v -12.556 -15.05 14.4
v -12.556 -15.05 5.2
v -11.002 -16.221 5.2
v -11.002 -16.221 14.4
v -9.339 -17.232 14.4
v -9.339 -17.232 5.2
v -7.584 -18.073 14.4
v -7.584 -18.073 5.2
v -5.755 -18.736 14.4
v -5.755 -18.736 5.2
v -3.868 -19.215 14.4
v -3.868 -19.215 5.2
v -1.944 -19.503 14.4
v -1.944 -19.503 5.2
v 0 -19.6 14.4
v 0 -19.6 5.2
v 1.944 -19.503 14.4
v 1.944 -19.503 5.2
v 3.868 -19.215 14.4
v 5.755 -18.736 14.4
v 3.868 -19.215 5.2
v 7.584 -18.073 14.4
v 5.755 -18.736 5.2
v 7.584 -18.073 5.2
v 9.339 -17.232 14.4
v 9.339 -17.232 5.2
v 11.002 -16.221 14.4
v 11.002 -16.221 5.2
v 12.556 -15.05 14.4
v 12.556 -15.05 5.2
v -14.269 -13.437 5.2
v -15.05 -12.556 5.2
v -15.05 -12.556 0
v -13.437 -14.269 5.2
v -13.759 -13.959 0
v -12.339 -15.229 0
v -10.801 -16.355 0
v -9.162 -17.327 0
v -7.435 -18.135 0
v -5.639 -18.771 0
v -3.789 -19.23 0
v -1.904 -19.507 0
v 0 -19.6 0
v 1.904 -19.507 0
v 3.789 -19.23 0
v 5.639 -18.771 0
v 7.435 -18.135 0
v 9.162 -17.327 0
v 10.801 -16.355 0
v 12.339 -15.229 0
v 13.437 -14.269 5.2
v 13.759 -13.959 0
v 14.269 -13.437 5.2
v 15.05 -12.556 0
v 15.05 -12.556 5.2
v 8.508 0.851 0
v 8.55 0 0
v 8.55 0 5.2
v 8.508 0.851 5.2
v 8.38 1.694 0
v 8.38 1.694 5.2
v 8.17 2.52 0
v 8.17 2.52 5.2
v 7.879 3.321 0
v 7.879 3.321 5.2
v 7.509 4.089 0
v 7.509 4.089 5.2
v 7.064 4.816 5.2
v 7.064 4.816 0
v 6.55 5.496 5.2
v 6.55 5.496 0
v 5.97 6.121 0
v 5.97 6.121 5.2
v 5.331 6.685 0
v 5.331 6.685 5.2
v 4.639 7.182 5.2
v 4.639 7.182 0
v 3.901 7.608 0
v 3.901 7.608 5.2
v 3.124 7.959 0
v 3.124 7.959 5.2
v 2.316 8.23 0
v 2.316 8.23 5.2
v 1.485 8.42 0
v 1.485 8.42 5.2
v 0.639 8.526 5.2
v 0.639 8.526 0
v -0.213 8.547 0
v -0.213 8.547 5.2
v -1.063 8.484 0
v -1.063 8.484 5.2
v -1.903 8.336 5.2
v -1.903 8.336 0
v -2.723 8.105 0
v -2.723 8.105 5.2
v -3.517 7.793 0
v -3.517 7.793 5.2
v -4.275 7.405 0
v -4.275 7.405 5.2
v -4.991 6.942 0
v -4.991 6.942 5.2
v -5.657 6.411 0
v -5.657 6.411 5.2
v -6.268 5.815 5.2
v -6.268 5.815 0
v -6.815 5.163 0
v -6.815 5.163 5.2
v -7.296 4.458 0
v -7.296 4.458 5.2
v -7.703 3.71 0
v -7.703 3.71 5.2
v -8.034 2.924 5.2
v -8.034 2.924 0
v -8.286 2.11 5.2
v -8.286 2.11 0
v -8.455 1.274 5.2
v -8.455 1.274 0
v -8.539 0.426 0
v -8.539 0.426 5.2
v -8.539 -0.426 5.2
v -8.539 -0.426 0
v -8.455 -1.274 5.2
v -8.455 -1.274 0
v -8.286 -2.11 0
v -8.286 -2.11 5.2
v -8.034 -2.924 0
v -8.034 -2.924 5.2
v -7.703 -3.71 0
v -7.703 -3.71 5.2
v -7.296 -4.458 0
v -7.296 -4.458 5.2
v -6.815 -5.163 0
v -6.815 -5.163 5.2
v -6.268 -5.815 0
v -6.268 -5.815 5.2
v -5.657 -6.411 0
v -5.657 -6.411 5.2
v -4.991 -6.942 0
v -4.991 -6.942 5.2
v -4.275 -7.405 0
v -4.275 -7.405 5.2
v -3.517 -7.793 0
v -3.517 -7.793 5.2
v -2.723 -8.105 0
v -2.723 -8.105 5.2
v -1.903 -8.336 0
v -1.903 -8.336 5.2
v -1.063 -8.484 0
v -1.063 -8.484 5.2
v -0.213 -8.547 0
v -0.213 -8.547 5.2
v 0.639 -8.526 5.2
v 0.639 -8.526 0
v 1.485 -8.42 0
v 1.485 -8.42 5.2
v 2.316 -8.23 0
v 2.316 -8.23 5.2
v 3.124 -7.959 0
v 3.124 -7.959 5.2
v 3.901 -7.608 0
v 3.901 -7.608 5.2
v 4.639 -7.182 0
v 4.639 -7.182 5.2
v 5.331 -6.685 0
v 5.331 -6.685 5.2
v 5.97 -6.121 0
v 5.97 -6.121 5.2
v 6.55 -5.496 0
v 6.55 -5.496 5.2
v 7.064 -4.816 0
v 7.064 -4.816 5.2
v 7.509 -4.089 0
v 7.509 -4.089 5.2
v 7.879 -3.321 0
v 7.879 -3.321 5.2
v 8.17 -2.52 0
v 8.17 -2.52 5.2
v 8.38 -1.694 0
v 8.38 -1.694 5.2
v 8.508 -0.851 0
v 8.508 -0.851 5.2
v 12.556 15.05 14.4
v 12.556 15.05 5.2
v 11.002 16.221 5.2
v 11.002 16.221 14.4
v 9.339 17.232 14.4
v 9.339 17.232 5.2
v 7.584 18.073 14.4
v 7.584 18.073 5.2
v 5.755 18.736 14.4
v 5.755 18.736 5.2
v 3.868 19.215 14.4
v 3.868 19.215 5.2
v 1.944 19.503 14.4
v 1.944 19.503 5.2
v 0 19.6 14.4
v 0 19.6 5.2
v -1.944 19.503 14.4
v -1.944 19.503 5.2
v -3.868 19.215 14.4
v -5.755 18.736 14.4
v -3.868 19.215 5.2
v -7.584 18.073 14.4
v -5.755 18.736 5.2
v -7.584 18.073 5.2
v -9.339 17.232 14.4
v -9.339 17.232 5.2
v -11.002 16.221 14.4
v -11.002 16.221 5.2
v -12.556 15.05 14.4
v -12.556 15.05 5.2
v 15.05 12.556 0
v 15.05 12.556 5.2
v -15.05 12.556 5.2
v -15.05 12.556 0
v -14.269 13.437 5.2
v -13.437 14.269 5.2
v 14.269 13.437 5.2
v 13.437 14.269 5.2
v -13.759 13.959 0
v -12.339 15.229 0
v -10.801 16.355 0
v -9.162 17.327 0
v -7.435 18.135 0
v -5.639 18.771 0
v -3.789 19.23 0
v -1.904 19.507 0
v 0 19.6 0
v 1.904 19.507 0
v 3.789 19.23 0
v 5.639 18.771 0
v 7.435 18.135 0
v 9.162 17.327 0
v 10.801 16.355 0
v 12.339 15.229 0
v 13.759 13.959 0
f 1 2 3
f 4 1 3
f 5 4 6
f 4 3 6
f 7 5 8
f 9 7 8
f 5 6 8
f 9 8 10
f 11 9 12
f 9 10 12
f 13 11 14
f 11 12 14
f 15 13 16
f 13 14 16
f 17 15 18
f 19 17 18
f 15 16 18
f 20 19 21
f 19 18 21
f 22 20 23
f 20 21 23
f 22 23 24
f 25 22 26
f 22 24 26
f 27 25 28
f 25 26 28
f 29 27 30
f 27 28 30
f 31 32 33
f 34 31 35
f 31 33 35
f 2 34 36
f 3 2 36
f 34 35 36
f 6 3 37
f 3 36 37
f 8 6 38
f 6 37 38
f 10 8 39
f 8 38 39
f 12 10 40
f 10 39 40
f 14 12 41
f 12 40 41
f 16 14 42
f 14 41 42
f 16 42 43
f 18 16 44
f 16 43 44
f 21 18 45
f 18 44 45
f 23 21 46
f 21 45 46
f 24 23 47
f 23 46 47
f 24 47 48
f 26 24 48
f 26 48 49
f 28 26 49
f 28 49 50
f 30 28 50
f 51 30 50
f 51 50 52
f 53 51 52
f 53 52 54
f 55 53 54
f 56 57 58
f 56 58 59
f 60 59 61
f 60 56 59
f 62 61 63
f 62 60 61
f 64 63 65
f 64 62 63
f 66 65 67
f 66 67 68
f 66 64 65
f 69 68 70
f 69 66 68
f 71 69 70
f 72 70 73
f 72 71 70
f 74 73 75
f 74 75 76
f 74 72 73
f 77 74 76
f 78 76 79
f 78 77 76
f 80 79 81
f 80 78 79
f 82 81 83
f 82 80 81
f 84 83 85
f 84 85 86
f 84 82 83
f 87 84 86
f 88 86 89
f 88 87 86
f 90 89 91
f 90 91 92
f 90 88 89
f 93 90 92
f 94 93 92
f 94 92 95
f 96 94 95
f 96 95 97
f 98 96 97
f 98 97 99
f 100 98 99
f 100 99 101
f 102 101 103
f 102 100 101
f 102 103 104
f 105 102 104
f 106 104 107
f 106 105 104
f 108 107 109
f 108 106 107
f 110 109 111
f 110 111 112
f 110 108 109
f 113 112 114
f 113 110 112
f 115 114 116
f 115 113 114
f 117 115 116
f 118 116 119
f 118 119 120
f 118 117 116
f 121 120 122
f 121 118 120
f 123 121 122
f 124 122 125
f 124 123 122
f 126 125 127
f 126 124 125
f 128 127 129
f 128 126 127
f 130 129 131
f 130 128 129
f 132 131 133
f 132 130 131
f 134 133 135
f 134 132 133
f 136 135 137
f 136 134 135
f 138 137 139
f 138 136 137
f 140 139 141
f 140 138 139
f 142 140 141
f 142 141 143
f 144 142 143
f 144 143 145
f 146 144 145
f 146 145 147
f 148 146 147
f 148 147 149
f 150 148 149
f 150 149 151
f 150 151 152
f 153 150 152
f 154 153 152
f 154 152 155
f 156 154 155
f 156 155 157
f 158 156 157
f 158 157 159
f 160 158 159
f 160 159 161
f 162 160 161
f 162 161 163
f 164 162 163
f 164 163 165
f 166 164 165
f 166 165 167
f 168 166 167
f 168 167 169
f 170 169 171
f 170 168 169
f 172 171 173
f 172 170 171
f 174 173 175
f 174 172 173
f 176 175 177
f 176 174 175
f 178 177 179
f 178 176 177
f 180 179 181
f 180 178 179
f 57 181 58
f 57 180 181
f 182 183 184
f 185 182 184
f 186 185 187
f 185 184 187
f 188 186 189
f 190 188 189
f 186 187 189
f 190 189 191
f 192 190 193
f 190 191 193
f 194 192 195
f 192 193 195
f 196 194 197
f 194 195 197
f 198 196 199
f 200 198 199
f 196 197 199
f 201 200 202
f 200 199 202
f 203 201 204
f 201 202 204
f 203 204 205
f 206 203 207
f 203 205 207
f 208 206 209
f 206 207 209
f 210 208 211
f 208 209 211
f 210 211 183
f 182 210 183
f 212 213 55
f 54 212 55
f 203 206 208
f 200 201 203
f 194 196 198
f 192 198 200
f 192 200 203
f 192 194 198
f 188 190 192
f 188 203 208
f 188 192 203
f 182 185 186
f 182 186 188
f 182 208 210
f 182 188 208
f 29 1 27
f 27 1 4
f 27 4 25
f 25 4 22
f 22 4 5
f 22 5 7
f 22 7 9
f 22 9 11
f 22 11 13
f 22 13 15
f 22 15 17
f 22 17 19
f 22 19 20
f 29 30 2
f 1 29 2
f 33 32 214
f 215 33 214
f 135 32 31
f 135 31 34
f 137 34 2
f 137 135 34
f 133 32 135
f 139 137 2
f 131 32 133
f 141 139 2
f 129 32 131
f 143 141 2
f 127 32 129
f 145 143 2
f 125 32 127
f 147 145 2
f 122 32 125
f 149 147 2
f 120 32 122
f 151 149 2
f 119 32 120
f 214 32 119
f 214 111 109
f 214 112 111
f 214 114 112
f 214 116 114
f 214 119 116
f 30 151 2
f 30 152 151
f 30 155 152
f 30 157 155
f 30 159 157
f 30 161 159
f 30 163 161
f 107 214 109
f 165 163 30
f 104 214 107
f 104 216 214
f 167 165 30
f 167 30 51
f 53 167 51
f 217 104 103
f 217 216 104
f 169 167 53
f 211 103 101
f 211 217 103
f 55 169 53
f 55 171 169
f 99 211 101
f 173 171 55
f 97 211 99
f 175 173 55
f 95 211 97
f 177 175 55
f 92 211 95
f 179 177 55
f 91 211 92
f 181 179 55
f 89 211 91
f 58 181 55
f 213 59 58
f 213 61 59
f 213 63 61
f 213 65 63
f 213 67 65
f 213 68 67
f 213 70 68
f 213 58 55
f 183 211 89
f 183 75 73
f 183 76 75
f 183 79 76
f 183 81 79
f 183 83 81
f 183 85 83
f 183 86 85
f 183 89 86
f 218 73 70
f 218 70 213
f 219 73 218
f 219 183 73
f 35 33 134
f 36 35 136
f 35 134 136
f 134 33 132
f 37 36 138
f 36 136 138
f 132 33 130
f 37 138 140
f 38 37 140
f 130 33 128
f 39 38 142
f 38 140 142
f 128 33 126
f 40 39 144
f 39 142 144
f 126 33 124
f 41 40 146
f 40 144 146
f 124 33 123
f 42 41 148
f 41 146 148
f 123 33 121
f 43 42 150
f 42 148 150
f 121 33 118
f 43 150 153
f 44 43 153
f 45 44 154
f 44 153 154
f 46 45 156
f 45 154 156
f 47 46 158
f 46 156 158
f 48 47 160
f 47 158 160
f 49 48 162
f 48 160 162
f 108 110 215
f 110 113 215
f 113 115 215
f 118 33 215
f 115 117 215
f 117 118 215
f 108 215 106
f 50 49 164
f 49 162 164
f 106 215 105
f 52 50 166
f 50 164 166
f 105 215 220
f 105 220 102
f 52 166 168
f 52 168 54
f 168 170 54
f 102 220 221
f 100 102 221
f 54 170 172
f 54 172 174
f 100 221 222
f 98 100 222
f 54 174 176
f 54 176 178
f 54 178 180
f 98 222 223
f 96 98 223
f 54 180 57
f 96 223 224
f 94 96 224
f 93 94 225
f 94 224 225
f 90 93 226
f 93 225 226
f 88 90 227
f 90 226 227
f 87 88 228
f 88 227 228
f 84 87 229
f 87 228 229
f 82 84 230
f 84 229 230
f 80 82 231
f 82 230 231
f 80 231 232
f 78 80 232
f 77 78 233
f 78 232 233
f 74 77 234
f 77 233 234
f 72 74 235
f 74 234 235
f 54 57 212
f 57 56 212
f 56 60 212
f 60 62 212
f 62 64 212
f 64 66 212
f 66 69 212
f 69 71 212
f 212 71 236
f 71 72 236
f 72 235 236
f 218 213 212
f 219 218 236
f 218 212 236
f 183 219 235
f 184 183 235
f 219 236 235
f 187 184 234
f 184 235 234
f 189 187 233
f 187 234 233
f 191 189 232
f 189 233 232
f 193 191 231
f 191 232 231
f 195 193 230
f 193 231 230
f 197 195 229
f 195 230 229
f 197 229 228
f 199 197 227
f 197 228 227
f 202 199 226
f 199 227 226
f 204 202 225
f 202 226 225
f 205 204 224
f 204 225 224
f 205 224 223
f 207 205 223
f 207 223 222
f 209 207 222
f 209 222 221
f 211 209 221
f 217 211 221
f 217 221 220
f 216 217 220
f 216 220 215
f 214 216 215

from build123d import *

# Parameters (mm, degrees)
F0_R     = 19.6
F0_R_2   = 8.55
F1_DEPTH = 5.2
F3_DEPTH = 9.2
F4_DEPTH = 5.201


with BuildPart() as f1:
    # F0 (on Top) → F1 (new body)
    with BuildSketch(Plane.XY):
        Circle(F0_R)
        Circle(F0_R_2, mode=Mode.SUBTRACT)
    extrude(amount=F1_DEPTH)

    # F2 (on face) → F3 (join)
    with BuildSketch(Plane.XY.offset(5.2)):
        with BuildLine():
            ThreePointArc((-12.5561737803, -15.05), (0, -19.6), (12.5561737803, -15.05))
            Line((12.5561737803, -15.05), (-12.5561737803, -15.05))
        make_face()
        with BuildLine():
            Line((-12.5561737803, 15.05), (12.5561737803, 15.05))
            ThreePointArc((12.5561737803, 15.05), (0, 19.6), (-12.5561737803, 15.05))
        make_face()
    extrude(amount=F3_DEPTH)

    # F2 (on face) → F4 (cut, through all)
    with BuildSketch(Plane.XY.offset(5.2)):
        with BuildLine():
            ThreePointArc((-15.05, 12.5561737803), (-19.6, 0), (-15.05, -12.5561737803))
            Line((-15.05, -12.5561737803), (-15.05, 12.5561737803))
        make_face()
        with BuildLine():
            Line((15.05, 12.5561737803), (15.05, -12.5561737803))
            ThreePointArc((15.05, -12.5561737803), (18.4274252135, -6.6775744099), (19.6, 0))
            ThreePointArc((19.6, 0), (18.4274252135, 6.6775744099), (15.05, 12.5561737803))
        make_face()
    extrude(amount=-F4_DEPTH, mode=Mode.SUBTRACT)


solid = f1.part
